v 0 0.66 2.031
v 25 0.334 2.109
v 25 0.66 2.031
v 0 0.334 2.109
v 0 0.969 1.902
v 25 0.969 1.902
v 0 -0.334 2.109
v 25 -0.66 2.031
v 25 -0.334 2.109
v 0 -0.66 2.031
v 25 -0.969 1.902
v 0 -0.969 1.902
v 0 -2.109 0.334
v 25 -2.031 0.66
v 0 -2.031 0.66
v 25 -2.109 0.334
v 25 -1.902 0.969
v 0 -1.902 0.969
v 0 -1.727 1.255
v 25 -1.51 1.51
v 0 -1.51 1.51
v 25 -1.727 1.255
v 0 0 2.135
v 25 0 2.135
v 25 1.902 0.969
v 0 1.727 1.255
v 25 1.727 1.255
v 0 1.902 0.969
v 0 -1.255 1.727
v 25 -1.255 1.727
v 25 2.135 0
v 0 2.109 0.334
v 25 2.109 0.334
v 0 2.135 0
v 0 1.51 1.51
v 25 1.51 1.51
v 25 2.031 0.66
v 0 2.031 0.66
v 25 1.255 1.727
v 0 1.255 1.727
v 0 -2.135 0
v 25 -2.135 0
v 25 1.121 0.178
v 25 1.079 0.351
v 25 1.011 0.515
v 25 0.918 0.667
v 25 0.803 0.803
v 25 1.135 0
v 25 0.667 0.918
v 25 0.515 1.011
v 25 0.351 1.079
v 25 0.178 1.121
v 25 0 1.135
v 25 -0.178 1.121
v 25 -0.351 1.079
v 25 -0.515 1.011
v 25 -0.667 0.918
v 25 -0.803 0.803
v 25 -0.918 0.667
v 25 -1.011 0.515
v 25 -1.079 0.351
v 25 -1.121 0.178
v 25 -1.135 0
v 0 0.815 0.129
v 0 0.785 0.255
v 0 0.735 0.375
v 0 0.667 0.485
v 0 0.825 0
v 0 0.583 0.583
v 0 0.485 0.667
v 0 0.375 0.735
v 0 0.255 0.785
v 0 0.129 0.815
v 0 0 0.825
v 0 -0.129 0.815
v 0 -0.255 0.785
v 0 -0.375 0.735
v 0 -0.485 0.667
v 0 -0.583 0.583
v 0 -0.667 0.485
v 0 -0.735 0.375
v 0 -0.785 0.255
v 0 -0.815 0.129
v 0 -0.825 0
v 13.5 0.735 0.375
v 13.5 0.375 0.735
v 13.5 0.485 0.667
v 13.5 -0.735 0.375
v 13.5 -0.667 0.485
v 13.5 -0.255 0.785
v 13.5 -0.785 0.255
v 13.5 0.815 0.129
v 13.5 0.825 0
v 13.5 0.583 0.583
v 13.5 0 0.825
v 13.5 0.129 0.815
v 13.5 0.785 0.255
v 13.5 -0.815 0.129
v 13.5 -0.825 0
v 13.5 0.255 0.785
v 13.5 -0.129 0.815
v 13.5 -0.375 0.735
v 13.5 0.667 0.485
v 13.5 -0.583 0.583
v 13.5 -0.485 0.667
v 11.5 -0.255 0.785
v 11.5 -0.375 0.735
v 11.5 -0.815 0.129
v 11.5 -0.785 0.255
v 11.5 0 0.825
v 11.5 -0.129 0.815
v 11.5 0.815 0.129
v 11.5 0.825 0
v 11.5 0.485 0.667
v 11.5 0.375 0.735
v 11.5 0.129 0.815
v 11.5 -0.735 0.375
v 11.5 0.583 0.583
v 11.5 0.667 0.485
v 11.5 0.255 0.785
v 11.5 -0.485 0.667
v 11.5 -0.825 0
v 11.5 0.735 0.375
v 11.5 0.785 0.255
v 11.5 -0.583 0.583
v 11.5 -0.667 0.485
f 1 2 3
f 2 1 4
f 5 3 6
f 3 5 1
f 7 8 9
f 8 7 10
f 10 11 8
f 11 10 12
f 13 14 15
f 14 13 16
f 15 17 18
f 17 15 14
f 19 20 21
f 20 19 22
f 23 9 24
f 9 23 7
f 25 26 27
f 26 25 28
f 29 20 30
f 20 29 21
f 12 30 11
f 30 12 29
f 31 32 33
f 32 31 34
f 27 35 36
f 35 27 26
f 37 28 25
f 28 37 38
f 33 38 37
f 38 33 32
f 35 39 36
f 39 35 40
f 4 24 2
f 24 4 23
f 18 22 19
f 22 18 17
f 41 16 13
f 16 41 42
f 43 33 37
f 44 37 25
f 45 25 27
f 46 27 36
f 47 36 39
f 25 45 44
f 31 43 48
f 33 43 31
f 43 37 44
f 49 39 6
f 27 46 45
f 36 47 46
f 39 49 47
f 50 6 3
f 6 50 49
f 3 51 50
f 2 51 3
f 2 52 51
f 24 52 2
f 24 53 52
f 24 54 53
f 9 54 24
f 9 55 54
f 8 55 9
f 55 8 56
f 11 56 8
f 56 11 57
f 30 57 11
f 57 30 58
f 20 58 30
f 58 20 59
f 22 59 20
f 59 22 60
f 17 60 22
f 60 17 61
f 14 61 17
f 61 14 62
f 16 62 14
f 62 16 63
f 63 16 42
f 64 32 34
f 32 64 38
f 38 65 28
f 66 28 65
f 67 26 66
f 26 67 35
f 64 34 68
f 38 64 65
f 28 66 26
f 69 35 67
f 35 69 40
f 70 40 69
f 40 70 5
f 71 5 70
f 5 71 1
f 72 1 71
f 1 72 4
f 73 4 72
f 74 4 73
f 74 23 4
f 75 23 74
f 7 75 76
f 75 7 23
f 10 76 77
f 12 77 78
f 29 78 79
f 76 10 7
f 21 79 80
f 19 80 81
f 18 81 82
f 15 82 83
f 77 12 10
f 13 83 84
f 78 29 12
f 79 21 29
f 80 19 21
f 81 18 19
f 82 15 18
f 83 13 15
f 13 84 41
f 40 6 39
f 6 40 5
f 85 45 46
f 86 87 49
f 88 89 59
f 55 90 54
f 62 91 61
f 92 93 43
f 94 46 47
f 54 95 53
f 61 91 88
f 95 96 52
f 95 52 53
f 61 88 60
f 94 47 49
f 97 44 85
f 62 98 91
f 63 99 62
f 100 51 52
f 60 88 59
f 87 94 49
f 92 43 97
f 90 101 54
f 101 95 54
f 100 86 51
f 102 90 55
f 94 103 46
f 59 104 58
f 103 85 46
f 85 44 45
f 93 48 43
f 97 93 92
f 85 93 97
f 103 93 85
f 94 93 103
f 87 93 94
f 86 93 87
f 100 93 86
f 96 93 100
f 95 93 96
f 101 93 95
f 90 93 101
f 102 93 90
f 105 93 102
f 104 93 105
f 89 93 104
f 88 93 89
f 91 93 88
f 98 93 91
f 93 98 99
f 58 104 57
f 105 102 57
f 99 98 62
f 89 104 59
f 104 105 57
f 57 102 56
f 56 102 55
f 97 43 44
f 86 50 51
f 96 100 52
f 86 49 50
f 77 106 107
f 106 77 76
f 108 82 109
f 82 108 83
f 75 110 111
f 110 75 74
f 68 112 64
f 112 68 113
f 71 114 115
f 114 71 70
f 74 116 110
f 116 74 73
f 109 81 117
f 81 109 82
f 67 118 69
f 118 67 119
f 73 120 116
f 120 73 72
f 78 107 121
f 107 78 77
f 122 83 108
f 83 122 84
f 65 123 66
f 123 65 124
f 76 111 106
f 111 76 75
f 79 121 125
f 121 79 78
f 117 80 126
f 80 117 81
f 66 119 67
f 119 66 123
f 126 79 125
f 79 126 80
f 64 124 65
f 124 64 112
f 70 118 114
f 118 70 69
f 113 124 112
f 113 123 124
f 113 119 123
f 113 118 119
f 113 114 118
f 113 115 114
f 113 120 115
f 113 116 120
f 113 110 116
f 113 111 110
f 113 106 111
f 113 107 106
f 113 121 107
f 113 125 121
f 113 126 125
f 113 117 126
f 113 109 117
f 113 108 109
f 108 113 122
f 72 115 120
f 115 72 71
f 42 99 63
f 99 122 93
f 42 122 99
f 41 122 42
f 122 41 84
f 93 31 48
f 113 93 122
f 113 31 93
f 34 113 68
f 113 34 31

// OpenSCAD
// Fly Rod repair
// Mark Reid
// June 1, 2013

// cylinder quality
cq = 40;

inner_diam_top = 2.27;
inner_diam_bot = 1.65;
thickness = 1;
brace_height = 25;

top_offset = 5;

inner_radius_top = inner_diam_top / 2;
inner_radius_bot = inner_diam_bot / 2;
outer_radius = inner_radius_top + thickness;

module thingy() {
 difference() {
  translate([0,0,0])
   cylinder(r=outer_radius, h=brace_height, $fn=cq);
  translate([0,0,(brace_height / 2) + thickness])
   #cylinder(r1=inner_radius_bot, r2=inner_radius_top, h=brace_height/2 - thickness, $fn=cq);
  translate([0,0,-thickness])
   #cylinder(r=inner_radius_bot, h=brace_height/2, $fn=cq);
 }
}

rotate([0,90,0])
difference() {
 thingy();
 translate([0,-50, -1]) #cube([100,100,100]);
}
